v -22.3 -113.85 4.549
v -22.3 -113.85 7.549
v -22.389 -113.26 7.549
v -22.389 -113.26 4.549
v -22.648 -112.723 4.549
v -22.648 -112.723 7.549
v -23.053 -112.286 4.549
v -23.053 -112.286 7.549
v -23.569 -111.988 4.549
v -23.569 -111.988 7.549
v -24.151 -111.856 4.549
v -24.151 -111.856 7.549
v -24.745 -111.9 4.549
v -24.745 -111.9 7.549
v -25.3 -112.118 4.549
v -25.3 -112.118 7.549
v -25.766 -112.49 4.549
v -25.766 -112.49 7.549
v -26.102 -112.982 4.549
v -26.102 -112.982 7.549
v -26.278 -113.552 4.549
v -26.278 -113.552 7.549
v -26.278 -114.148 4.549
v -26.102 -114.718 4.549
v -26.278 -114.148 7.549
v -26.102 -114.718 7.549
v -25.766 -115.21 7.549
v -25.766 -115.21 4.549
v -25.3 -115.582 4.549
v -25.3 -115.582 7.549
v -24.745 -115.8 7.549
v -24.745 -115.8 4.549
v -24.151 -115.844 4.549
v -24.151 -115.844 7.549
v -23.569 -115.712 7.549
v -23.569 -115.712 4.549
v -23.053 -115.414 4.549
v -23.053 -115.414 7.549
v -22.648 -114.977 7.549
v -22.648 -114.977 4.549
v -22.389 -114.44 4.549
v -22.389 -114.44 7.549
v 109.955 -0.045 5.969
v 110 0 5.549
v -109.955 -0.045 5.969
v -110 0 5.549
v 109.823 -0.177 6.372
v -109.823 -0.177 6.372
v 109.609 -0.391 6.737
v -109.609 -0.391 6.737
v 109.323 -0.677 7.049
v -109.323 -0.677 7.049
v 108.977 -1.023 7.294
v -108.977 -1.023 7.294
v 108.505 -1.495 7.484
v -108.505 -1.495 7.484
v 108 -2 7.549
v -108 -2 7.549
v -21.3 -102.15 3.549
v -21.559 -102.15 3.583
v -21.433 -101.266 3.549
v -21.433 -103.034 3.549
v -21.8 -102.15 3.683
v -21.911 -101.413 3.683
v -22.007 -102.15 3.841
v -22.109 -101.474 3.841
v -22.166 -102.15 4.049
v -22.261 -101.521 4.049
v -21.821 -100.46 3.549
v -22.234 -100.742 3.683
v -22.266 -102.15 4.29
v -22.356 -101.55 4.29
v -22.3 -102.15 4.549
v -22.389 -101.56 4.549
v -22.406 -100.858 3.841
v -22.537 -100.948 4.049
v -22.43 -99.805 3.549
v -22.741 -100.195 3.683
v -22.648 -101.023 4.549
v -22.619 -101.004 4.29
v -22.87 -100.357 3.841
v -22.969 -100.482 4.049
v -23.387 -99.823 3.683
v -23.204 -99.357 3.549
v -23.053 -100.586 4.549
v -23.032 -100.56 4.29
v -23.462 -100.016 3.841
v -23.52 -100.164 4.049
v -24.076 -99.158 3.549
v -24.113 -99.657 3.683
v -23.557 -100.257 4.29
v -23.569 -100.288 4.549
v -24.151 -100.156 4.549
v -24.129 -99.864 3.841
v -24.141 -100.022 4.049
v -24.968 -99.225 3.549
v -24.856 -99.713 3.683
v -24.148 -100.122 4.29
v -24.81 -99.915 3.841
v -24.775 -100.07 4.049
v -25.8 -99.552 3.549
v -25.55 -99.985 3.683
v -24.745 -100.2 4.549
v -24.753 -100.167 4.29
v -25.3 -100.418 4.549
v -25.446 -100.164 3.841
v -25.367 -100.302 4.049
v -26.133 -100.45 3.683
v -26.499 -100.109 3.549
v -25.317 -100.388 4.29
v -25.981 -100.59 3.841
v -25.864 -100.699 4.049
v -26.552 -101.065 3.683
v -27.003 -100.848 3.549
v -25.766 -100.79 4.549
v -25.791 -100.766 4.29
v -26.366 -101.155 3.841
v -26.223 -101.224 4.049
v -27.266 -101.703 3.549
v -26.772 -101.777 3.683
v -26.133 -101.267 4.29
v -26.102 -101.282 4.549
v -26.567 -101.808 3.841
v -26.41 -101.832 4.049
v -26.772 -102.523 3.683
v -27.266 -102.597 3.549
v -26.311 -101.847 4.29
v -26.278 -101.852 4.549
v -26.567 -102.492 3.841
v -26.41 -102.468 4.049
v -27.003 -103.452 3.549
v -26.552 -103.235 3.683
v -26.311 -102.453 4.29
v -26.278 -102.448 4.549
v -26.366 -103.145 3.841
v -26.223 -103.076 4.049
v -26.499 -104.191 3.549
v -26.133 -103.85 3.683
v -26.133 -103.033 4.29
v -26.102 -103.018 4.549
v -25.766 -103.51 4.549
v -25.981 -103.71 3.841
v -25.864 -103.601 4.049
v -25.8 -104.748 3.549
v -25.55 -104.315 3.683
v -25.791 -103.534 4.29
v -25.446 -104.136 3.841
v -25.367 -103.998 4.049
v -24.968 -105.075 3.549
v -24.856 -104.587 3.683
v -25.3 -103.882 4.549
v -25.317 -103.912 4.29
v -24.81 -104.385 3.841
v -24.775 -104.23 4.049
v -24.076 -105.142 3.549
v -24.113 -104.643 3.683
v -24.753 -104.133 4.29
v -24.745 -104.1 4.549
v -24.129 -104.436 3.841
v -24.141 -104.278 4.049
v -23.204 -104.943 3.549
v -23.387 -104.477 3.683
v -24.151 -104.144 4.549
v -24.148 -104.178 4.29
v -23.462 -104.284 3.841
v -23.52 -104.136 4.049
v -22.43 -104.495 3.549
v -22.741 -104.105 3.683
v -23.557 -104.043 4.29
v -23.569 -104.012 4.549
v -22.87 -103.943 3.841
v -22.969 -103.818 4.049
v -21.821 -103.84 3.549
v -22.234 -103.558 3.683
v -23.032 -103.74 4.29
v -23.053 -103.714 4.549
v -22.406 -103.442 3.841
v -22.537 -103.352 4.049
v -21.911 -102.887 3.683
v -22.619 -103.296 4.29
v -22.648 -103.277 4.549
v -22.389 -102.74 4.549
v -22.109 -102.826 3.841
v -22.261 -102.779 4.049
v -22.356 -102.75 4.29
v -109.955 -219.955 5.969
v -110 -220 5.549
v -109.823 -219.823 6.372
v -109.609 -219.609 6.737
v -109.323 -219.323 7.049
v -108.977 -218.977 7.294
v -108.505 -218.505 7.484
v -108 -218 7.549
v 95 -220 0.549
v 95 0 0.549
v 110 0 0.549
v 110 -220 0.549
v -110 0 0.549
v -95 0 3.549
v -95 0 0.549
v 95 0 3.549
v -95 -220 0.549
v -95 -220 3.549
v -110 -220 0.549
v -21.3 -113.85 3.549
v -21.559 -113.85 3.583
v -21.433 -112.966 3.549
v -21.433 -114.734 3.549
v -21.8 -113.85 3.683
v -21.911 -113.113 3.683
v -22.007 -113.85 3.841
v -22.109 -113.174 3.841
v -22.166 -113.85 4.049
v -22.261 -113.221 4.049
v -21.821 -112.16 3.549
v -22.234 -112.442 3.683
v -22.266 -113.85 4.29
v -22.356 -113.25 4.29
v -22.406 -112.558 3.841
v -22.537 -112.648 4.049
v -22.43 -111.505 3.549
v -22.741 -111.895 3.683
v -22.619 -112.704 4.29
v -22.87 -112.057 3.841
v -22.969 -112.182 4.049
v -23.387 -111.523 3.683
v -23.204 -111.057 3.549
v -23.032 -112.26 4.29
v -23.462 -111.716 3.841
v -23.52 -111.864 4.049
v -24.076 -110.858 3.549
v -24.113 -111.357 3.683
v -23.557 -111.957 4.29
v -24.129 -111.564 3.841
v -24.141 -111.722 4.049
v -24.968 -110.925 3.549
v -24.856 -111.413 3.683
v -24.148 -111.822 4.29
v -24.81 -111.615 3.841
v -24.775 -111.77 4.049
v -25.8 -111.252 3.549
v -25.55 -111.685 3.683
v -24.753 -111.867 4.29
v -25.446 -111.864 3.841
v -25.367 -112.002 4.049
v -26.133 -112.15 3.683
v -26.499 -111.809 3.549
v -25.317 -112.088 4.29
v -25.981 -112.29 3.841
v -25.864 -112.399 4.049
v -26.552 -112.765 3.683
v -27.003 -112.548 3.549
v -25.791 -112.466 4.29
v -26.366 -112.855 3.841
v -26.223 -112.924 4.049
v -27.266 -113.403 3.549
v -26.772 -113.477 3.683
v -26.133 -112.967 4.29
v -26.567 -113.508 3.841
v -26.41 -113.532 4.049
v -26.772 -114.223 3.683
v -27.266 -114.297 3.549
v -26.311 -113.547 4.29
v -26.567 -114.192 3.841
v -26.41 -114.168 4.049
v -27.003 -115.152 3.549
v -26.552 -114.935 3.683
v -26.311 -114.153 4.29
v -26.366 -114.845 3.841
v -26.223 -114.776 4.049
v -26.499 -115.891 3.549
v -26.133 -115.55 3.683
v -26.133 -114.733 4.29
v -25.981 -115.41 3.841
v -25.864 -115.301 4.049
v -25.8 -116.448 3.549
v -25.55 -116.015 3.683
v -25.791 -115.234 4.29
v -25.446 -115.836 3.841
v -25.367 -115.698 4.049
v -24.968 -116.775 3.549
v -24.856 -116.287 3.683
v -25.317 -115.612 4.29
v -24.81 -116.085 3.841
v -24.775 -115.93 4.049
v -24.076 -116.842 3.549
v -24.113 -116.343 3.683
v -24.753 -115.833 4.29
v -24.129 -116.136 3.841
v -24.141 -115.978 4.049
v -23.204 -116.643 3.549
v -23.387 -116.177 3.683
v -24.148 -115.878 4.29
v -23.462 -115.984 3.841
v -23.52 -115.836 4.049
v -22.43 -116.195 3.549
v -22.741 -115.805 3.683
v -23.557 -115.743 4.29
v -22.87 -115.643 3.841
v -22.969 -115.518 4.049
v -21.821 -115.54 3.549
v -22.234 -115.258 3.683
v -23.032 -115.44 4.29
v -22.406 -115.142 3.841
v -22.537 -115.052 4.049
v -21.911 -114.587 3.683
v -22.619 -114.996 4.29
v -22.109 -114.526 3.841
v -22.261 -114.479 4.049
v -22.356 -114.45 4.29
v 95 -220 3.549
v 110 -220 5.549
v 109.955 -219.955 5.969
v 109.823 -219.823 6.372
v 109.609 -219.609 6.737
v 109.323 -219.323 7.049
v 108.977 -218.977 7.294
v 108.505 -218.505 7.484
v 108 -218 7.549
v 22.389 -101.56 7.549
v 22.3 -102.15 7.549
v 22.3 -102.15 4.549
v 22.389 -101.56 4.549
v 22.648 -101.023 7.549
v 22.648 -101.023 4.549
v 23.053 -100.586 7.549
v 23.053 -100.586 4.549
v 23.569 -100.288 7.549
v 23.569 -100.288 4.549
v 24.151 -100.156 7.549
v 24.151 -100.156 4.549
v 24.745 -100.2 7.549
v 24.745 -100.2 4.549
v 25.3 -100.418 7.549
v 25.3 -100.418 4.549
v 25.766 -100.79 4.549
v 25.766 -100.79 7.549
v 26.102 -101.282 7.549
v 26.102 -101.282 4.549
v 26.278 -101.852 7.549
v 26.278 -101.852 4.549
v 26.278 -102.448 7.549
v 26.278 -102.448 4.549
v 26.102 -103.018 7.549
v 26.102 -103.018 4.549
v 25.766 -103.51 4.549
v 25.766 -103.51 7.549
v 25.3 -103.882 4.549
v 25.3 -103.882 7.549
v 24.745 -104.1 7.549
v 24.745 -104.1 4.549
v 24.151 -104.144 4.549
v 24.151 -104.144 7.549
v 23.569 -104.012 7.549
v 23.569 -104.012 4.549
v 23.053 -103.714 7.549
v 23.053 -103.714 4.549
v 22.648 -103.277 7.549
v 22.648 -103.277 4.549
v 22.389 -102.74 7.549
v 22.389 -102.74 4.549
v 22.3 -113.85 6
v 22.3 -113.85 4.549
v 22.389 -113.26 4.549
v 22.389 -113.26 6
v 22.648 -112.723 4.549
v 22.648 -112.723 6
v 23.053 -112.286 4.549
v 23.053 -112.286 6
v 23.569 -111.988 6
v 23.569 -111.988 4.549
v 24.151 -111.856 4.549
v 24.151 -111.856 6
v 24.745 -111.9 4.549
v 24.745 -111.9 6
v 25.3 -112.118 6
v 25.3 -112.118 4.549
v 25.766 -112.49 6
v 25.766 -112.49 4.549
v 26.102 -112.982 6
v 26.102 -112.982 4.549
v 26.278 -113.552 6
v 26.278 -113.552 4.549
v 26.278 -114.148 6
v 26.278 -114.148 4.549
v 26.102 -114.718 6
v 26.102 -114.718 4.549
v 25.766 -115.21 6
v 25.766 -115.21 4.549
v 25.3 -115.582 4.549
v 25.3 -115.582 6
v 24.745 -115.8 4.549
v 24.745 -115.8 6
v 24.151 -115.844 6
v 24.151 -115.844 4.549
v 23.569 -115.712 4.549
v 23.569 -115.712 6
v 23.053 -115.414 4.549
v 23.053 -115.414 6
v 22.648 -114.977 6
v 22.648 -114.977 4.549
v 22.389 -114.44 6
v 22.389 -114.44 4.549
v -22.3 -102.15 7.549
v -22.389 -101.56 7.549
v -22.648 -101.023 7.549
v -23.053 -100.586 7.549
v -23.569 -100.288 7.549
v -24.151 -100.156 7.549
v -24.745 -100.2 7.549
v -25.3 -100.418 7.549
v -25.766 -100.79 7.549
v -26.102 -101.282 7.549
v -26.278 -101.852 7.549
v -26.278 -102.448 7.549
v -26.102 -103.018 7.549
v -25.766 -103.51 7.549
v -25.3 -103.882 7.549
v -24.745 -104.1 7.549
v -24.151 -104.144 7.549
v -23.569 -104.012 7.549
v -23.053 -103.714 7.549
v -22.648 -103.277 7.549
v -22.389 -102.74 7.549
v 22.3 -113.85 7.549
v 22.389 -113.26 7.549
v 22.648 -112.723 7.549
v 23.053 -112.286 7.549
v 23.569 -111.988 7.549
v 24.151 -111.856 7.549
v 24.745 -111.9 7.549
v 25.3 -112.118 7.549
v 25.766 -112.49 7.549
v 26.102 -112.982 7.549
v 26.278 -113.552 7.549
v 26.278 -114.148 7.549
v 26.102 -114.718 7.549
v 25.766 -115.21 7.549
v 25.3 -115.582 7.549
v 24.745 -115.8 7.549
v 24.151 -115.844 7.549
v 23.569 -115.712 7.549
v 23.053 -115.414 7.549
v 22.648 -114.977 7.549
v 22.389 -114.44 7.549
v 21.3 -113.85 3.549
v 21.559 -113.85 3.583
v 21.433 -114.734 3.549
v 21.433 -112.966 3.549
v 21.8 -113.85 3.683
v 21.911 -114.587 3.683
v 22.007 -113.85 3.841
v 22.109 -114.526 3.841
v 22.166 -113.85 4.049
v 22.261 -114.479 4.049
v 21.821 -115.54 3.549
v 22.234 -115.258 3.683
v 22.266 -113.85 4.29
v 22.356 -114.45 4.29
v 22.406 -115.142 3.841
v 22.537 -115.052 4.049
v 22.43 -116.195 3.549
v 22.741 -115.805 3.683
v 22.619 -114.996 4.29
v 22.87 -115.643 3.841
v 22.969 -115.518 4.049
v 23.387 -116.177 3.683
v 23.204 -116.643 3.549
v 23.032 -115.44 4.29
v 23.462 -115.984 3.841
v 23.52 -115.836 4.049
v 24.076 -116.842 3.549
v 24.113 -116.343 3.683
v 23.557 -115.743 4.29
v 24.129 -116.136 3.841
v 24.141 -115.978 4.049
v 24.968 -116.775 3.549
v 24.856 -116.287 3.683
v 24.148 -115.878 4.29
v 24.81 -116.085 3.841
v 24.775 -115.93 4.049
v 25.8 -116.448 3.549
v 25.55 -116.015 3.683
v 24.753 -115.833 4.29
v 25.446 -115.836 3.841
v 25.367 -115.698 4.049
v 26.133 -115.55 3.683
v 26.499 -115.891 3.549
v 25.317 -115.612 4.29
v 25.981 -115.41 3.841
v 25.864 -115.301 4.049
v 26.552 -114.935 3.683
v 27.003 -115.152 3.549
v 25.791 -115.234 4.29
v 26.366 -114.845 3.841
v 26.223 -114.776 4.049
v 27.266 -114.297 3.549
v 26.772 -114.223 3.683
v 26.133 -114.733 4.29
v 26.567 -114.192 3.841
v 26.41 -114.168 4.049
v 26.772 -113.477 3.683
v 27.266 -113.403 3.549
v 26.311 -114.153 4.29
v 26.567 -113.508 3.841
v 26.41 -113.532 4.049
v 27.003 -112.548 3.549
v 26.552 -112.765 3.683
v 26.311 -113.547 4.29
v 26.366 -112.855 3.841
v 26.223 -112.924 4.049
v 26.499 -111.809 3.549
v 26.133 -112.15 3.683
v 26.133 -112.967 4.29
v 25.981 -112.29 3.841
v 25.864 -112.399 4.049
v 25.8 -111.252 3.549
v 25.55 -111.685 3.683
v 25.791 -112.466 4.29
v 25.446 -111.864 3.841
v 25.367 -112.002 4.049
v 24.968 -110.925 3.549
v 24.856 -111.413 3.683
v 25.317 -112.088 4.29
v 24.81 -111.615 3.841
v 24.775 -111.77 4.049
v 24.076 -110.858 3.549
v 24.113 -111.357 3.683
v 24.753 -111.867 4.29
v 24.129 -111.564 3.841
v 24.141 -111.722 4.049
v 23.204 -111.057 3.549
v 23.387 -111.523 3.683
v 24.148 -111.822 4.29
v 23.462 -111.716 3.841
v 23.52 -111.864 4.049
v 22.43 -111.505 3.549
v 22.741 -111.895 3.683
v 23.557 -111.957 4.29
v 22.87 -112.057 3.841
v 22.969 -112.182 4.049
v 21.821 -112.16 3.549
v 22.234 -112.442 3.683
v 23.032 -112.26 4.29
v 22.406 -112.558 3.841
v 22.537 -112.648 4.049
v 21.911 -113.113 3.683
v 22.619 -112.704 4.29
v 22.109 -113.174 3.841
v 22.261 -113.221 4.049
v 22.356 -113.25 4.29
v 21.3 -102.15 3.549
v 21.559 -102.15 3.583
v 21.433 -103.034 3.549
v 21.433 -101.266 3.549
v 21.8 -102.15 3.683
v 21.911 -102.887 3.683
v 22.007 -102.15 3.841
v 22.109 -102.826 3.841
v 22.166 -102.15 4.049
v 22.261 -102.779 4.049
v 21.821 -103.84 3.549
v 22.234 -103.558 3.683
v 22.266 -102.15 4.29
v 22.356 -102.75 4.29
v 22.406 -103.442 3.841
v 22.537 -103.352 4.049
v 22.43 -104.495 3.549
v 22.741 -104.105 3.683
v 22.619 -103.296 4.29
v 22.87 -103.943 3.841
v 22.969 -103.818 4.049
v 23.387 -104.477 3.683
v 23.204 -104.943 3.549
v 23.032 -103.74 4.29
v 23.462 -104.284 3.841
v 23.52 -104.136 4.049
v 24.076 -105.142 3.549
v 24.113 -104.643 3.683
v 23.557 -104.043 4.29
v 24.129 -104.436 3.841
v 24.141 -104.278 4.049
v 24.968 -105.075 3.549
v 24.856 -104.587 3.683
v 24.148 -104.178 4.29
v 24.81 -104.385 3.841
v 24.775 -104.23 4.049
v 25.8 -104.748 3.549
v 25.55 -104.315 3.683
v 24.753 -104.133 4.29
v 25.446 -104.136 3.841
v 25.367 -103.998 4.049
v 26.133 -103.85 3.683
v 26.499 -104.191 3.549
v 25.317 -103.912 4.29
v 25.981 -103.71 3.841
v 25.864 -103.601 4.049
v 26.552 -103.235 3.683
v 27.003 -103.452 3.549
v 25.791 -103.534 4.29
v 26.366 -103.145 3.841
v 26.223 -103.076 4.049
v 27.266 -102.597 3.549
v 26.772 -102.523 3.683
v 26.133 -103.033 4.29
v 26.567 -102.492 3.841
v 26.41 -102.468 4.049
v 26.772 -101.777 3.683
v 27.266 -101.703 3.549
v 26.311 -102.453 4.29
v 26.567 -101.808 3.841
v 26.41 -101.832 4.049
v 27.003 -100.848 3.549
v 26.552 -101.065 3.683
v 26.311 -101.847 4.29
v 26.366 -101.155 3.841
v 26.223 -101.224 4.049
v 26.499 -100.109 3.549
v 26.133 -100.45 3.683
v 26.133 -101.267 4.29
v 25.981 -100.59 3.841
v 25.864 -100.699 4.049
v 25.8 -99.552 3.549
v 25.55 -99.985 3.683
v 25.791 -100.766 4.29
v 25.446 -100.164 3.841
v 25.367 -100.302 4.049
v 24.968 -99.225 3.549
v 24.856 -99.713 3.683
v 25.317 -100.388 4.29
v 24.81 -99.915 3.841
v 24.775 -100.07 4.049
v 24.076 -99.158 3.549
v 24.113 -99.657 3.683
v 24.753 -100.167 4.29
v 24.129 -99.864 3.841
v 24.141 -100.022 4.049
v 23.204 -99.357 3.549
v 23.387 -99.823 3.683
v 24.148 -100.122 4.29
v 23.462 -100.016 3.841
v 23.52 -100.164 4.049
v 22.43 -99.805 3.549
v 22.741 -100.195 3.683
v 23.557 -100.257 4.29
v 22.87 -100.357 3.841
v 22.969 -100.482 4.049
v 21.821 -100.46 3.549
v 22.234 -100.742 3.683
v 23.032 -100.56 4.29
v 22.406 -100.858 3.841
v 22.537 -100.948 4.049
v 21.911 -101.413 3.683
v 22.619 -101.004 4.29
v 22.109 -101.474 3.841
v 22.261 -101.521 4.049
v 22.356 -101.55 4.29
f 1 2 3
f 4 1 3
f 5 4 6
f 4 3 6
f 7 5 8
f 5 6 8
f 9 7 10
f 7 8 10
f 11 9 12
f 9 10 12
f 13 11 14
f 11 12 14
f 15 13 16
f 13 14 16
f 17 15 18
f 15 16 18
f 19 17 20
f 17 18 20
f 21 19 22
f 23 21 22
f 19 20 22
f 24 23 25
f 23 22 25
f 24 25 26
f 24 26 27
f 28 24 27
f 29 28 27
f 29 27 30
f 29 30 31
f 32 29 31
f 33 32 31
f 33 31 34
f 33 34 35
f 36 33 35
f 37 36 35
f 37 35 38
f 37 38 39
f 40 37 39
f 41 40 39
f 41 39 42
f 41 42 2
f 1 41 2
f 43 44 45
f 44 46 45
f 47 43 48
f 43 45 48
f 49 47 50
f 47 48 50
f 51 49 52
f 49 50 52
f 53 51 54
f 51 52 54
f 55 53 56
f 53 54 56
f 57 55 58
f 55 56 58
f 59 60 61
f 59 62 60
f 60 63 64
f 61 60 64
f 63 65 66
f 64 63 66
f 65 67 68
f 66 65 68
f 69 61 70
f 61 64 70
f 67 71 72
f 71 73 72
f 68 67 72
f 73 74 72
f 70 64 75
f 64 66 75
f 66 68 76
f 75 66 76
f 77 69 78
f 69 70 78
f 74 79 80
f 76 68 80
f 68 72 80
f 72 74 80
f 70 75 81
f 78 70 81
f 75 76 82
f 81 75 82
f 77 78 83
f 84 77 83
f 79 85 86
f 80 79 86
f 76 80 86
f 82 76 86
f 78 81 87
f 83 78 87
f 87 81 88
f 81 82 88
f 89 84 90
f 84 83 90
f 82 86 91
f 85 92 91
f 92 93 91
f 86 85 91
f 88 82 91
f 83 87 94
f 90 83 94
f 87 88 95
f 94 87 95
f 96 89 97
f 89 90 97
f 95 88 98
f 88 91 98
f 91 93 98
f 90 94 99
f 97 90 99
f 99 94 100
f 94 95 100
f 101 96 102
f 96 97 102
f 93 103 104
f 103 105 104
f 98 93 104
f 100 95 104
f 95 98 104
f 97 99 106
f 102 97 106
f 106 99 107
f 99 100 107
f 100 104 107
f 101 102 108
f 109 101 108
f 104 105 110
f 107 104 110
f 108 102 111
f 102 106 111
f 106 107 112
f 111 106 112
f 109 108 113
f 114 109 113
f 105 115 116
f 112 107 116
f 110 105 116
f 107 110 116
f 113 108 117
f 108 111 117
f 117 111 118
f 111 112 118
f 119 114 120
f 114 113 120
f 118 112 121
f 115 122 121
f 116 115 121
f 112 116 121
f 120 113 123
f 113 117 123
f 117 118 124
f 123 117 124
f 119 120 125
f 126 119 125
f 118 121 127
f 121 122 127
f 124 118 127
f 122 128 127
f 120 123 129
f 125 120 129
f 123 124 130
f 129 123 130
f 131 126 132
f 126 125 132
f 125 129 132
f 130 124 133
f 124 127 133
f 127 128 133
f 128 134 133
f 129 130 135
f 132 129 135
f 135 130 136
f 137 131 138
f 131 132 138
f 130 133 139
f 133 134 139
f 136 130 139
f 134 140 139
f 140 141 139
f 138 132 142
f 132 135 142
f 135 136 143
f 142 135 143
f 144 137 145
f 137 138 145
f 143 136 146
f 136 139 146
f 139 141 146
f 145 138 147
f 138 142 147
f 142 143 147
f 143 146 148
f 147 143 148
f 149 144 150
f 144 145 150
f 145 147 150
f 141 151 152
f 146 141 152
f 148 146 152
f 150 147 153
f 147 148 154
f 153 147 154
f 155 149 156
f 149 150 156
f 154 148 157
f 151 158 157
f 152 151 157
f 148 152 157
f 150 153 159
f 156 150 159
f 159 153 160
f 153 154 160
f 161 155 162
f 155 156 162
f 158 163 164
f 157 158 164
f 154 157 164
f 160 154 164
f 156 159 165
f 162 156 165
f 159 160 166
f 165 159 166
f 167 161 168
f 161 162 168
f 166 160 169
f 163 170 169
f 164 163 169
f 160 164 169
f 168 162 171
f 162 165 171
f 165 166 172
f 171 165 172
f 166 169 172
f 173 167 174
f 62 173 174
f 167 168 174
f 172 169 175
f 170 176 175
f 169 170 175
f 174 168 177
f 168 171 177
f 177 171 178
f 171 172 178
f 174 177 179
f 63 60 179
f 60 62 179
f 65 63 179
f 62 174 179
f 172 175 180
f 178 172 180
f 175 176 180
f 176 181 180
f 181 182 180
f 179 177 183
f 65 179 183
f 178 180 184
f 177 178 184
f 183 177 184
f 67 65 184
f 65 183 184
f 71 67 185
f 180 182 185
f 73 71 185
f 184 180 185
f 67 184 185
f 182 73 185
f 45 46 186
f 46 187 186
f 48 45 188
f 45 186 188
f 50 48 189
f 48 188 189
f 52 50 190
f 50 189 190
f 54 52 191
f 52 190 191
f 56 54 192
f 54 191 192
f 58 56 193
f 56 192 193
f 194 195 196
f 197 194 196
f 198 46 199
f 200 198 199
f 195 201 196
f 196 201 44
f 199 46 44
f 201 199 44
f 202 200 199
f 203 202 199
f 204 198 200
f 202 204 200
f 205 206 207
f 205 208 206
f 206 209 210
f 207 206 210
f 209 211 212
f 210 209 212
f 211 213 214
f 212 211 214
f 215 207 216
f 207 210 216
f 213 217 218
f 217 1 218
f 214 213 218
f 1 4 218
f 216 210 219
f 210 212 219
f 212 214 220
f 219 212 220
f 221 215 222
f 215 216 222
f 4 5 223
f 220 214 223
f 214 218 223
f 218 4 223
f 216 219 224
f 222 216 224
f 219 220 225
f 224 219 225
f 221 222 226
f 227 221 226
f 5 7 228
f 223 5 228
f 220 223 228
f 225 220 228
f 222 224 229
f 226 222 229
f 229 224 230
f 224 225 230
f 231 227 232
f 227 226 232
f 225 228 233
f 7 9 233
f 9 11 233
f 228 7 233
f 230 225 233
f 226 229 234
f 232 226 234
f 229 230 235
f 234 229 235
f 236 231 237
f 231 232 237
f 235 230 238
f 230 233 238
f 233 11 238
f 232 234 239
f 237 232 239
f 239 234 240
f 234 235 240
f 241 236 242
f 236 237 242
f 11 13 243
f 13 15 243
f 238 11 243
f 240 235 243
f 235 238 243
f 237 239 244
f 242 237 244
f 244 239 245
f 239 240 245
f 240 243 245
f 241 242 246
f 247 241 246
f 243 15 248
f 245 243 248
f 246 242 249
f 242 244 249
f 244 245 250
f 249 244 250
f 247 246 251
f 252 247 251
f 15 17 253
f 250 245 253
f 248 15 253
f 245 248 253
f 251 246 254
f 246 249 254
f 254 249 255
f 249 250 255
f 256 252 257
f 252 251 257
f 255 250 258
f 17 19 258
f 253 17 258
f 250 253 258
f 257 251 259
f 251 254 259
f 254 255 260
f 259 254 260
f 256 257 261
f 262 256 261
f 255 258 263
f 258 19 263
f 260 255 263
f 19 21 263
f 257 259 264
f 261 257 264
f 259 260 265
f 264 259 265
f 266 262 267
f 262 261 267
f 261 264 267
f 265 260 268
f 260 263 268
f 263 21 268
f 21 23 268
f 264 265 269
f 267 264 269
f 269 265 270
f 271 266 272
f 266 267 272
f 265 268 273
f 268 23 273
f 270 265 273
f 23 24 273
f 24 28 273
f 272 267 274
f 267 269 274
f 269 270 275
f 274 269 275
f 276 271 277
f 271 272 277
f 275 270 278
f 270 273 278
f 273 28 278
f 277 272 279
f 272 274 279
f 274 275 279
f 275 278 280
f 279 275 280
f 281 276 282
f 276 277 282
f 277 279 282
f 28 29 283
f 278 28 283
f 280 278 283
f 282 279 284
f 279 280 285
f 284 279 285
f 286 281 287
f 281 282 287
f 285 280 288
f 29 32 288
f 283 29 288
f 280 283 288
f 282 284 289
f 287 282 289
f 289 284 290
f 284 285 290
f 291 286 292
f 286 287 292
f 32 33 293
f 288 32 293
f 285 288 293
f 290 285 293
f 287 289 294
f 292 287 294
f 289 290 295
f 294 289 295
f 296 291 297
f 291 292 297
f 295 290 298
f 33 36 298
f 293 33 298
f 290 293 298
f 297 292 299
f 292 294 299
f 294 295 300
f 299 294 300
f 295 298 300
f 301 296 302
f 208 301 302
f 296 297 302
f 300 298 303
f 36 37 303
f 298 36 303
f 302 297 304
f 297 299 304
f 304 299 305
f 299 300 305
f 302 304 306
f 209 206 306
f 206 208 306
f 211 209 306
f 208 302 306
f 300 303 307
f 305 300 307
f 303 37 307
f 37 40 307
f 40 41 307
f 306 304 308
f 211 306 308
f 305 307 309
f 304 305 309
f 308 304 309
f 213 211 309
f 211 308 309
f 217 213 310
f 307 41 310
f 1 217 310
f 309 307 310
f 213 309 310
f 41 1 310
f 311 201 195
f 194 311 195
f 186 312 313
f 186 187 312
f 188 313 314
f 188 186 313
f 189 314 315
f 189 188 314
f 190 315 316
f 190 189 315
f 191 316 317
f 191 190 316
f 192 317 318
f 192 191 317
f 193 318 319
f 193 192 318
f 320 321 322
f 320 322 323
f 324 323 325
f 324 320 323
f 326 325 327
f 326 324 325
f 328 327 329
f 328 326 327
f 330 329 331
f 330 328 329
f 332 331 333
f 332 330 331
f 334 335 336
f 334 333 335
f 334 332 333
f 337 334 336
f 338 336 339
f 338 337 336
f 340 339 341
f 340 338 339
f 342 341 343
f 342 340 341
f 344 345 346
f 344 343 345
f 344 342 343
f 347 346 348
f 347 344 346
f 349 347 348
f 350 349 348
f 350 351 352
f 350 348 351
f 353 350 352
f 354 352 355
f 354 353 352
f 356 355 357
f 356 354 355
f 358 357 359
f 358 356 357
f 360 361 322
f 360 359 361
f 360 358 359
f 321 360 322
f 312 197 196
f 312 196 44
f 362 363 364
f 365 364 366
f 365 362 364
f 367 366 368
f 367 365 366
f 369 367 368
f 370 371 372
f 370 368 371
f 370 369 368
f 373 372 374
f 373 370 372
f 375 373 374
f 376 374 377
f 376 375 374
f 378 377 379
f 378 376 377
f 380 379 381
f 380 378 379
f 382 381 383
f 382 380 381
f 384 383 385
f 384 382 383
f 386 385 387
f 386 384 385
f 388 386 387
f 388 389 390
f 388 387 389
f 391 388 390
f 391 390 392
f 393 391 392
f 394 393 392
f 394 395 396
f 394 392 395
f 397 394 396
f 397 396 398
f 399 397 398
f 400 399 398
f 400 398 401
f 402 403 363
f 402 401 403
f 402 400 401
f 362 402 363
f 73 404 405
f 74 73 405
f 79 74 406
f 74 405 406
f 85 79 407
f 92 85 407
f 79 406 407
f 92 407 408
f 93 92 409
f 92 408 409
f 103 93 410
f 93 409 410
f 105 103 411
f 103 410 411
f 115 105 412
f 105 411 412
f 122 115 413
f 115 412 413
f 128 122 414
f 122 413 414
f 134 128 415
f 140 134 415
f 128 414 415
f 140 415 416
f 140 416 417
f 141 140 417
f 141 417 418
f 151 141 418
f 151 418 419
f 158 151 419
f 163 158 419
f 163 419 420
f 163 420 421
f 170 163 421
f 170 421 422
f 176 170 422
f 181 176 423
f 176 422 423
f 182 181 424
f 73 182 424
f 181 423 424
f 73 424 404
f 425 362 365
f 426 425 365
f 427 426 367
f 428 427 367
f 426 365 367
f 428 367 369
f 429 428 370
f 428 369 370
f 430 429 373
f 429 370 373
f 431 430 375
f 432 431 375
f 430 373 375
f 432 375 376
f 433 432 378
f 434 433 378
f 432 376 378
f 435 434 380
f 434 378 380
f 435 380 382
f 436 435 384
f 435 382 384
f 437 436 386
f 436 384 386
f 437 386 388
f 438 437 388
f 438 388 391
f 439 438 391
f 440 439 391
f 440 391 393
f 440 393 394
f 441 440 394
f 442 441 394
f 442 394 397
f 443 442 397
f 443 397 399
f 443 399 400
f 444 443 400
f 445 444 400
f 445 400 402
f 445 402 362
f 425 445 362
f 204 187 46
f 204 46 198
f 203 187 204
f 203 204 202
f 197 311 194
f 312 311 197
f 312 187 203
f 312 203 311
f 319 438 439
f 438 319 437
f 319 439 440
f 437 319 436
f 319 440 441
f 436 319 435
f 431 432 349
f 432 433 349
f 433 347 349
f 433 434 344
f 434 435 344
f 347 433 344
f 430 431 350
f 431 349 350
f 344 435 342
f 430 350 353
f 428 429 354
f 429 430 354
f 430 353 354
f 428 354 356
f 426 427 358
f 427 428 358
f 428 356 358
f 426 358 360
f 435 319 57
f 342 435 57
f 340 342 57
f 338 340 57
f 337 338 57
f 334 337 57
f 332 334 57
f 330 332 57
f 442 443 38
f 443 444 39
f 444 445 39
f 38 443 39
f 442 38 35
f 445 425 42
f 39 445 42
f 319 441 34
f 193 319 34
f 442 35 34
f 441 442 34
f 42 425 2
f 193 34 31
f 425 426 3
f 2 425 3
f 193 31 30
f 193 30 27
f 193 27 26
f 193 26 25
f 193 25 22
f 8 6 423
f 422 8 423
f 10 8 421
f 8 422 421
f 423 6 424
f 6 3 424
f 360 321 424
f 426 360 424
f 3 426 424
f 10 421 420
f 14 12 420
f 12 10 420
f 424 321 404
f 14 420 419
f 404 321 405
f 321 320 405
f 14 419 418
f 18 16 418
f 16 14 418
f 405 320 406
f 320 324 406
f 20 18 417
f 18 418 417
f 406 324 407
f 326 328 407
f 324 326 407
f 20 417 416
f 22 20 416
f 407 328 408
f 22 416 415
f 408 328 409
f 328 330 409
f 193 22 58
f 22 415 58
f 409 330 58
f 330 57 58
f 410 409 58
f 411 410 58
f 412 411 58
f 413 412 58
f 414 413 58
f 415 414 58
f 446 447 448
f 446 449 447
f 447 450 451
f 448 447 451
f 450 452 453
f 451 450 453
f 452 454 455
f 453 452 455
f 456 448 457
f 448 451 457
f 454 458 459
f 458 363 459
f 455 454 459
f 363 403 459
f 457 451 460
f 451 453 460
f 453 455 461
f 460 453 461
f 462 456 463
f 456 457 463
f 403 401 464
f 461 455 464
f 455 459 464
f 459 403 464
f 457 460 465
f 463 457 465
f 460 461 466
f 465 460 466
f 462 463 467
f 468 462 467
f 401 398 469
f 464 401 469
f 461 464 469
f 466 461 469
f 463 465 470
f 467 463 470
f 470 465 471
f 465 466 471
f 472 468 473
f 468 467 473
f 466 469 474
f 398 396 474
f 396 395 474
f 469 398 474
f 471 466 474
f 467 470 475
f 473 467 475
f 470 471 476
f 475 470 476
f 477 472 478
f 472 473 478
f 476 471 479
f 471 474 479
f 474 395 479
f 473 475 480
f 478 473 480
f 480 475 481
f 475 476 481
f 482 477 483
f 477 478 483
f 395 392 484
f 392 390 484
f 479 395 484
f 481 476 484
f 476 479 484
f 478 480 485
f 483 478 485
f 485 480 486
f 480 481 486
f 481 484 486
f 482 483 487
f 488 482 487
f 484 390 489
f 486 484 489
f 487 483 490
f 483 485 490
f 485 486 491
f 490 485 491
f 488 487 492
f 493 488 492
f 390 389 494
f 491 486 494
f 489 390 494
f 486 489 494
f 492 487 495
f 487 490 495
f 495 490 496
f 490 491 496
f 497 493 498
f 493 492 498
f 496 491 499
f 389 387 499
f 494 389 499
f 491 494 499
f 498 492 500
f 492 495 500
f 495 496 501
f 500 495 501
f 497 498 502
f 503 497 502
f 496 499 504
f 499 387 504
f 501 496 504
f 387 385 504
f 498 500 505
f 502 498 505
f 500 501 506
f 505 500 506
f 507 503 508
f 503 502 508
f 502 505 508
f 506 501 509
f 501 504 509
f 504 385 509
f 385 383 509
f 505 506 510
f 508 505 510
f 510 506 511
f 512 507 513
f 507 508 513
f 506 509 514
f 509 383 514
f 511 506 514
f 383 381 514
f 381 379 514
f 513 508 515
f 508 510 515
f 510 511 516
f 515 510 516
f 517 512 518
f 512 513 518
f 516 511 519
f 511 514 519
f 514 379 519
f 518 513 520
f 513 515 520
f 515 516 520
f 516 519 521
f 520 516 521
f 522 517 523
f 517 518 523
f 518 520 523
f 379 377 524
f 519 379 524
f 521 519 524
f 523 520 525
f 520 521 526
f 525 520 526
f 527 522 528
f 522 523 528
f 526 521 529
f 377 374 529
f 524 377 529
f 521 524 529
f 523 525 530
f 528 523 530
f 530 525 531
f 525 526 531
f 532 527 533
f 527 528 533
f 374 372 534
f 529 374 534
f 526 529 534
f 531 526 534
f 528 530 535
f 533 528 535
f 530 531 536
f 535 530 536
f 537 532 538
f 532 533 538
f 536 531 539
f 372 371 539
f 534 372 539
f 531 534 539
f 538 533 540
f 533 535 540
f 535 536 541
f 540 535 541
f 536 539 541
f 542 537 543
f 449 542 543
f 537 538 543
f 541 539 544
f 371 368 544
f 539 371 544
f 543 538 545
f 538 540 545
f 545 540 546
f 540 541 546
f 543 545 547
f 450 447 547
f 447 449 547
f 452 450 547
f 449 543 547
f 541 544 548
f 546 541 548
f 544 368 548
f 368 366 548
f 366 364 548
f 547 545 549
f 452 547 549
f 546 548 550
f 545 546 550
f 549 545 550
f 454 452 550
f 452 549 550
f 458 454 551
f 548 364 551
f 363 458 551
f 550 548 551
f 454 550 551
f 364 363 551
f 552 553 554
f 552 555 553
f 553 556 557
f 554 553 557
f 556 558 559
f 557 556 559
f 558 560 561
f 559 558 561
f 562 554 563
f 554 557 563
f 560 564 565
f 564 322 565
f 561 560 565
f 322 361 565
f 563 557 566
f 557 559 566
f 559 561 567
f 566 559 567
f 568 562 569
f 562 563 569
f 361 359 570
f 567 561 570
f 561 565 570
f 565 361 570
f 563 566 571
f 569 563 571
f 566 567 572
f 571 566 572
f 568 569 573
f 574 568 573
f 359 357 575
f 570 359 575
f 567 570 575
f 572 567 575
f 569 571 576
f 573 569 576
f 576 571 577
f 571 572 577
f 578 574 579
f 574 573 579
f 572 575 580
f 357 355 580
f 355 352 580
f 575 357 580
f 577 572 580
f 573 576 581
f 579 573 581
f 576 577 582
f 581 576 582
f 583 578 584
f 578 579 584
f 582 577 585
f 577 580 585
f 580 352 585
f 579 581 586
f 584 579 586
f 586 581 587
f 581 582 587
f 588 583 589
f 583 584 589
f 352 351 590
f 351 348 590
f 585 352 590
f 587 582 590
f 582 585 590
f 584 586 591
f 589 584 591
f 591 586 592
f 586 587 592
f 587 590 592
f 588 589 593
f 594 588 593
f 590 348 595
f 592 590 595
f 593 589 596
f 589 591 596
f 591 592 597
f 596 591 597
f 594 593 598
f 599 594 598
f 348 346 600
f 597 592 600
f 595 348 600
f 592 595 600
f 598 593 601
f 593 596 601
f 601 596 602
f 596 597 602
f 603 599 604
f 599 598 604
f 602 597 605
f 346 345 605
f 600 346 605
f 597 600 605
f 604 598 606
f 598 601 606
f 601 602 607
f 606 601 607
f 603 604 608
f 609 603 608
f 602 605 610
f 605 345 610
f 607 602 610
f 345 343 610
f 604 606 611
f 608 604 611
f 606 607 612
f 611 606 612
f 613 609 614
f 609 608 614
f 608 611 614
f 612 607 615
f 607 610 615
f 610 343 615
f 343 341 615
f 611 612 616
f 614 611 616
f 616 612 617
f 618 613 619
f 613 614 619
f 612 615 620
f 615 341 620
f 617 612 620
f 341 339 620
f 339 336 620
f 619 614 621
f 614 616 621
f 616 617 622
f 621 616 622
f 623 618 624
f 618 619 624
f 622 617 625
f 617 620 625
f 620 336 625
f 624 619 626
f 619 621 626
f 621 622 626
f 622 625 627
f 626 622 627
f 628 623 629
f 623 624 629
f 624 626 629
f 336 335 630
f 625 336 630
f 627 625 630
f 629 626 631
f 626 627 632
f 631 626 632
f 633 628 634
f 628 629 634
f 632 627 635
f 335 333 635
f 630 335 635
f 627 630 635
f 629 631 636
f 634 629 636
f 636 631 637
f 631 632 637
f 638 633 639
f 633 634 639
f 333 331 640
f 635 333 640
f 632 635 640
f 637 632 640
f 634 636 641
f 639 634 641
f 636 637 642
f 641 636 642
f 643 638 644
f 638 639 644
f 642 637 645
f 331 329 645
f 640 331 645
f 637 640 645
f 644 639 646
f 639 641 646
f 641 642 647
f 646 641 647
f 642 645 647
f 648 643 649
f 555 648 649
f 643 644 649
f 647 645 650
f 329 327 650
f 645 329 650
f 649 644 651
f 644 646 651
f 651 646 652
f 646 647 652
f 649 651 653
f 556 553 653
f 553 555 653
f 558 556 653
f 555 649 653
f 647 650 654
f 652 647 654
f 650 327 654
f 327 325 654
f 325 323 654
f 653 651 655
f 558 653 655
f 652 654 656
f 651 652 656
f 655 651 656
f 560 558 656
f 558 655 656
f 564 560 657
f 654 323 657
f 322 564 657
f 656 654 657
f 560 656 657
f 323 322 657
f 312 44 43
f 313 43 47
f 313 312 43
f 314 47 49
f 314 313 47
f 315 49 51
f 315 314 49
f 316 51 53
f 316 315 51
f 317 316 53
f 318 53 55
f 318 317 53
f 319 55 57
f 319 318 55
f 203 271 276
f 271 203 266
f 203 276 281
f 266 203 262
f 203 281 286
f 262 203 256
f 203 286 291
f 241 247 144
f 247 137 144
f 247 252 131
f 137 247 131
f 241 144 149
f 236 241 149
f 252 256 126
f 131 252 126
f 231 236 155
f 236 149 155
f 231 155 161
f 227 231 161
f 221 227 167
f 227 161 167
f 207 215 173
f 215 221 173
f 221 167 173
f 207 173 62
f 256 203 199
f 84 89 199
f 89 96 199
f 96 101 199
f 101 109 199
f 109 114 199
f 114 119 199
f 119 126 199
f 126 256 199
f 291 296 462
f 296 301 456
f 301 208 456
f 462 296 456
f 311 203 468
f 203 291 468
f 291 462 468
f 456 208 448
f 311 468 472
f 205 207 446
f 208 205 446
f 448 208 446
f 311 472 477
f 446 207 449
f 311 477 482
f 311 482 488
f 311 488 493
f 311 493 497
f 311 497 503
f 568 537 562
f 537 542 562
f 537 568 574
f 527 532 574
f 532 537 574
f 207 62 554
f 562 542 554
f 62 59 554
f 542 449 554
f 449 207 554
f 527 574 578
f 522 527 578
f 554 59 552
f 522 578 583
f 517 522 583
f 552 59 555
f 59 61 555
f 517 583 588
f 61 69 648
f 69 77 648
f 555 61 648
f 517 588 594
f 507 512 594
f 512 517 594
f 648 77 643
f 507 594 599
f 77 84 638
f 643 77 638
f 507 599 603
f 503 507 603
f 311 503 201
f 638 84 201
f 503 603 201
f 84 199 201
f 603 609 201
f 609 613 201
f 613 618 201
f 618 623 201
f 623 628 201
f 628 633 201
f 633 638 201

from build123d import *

# Parameters (mm, degrees)
PAD_DEPTH    = 220
SKETCH002_R  = 2
POCKET_DEPTH = 5.5
FILLET_R     = 2
FILLET001_R  = 1


with BuildPart() as part:
    # Sketch → Pad (new body)
    with BuildSketch(Plane.XZ):
        Polygon((-95, 0.548531), (-95, 3.548531), (95, 3.548531), (95, 0.548531), (110, 0.548531), (110, 7.548531), (-110, 7.548531), (-110, 0.548531), align=None)
    extrude(amount=PAD_DEPTH)

    # Sketch002 (on DatumPlane) → Pocket (cut, symmetric)
    with BuildSketch(Plane.XY.offset(6)):
        with Locations((-24.3, -113.85)):
            Circle(SKETCH002_R)
        with Locations((-24.3, -102.15)):
            Circle(SKETCH002_R)
    pocket = extrude(amount=POCKET_DEPTH, both=True, mode=Mode.SUBTRACT)

    # Mirrored: Pocket across Sketch002 V_Axis
    add(pocket.mirror(Plane(origin=(0, 0, 6), x_dir=(0, 0, 1), z_dir=(1, 0, 0))), mode=Mode.SUBTRACT)

    # Fillet
    fillet_edges = [part.edges().sort_by_distance(p)[0] for p in [
        (0, 0, 7.548531),
        (-110, -110, 7.548531),
        (0, -220, 7.548531),
        (110, -110, 7.548531),
    ]]
    fillet(fillet_edges, radius=FILLET_R)

    # Fillet001
    fillet001_edges = [part.edges().sort_by_distance(p)[0] for p in [
        (-26.3, -113.85, 3.548531),
        (-26.3, -102.15, 3.548531),
        (26.3, -113.85, 3.548531),
        (26.3, -102.15, 3.548531),
    ]]
    fillet(fillet001_edges, radius=FILLET001_R)


solid = part.part
